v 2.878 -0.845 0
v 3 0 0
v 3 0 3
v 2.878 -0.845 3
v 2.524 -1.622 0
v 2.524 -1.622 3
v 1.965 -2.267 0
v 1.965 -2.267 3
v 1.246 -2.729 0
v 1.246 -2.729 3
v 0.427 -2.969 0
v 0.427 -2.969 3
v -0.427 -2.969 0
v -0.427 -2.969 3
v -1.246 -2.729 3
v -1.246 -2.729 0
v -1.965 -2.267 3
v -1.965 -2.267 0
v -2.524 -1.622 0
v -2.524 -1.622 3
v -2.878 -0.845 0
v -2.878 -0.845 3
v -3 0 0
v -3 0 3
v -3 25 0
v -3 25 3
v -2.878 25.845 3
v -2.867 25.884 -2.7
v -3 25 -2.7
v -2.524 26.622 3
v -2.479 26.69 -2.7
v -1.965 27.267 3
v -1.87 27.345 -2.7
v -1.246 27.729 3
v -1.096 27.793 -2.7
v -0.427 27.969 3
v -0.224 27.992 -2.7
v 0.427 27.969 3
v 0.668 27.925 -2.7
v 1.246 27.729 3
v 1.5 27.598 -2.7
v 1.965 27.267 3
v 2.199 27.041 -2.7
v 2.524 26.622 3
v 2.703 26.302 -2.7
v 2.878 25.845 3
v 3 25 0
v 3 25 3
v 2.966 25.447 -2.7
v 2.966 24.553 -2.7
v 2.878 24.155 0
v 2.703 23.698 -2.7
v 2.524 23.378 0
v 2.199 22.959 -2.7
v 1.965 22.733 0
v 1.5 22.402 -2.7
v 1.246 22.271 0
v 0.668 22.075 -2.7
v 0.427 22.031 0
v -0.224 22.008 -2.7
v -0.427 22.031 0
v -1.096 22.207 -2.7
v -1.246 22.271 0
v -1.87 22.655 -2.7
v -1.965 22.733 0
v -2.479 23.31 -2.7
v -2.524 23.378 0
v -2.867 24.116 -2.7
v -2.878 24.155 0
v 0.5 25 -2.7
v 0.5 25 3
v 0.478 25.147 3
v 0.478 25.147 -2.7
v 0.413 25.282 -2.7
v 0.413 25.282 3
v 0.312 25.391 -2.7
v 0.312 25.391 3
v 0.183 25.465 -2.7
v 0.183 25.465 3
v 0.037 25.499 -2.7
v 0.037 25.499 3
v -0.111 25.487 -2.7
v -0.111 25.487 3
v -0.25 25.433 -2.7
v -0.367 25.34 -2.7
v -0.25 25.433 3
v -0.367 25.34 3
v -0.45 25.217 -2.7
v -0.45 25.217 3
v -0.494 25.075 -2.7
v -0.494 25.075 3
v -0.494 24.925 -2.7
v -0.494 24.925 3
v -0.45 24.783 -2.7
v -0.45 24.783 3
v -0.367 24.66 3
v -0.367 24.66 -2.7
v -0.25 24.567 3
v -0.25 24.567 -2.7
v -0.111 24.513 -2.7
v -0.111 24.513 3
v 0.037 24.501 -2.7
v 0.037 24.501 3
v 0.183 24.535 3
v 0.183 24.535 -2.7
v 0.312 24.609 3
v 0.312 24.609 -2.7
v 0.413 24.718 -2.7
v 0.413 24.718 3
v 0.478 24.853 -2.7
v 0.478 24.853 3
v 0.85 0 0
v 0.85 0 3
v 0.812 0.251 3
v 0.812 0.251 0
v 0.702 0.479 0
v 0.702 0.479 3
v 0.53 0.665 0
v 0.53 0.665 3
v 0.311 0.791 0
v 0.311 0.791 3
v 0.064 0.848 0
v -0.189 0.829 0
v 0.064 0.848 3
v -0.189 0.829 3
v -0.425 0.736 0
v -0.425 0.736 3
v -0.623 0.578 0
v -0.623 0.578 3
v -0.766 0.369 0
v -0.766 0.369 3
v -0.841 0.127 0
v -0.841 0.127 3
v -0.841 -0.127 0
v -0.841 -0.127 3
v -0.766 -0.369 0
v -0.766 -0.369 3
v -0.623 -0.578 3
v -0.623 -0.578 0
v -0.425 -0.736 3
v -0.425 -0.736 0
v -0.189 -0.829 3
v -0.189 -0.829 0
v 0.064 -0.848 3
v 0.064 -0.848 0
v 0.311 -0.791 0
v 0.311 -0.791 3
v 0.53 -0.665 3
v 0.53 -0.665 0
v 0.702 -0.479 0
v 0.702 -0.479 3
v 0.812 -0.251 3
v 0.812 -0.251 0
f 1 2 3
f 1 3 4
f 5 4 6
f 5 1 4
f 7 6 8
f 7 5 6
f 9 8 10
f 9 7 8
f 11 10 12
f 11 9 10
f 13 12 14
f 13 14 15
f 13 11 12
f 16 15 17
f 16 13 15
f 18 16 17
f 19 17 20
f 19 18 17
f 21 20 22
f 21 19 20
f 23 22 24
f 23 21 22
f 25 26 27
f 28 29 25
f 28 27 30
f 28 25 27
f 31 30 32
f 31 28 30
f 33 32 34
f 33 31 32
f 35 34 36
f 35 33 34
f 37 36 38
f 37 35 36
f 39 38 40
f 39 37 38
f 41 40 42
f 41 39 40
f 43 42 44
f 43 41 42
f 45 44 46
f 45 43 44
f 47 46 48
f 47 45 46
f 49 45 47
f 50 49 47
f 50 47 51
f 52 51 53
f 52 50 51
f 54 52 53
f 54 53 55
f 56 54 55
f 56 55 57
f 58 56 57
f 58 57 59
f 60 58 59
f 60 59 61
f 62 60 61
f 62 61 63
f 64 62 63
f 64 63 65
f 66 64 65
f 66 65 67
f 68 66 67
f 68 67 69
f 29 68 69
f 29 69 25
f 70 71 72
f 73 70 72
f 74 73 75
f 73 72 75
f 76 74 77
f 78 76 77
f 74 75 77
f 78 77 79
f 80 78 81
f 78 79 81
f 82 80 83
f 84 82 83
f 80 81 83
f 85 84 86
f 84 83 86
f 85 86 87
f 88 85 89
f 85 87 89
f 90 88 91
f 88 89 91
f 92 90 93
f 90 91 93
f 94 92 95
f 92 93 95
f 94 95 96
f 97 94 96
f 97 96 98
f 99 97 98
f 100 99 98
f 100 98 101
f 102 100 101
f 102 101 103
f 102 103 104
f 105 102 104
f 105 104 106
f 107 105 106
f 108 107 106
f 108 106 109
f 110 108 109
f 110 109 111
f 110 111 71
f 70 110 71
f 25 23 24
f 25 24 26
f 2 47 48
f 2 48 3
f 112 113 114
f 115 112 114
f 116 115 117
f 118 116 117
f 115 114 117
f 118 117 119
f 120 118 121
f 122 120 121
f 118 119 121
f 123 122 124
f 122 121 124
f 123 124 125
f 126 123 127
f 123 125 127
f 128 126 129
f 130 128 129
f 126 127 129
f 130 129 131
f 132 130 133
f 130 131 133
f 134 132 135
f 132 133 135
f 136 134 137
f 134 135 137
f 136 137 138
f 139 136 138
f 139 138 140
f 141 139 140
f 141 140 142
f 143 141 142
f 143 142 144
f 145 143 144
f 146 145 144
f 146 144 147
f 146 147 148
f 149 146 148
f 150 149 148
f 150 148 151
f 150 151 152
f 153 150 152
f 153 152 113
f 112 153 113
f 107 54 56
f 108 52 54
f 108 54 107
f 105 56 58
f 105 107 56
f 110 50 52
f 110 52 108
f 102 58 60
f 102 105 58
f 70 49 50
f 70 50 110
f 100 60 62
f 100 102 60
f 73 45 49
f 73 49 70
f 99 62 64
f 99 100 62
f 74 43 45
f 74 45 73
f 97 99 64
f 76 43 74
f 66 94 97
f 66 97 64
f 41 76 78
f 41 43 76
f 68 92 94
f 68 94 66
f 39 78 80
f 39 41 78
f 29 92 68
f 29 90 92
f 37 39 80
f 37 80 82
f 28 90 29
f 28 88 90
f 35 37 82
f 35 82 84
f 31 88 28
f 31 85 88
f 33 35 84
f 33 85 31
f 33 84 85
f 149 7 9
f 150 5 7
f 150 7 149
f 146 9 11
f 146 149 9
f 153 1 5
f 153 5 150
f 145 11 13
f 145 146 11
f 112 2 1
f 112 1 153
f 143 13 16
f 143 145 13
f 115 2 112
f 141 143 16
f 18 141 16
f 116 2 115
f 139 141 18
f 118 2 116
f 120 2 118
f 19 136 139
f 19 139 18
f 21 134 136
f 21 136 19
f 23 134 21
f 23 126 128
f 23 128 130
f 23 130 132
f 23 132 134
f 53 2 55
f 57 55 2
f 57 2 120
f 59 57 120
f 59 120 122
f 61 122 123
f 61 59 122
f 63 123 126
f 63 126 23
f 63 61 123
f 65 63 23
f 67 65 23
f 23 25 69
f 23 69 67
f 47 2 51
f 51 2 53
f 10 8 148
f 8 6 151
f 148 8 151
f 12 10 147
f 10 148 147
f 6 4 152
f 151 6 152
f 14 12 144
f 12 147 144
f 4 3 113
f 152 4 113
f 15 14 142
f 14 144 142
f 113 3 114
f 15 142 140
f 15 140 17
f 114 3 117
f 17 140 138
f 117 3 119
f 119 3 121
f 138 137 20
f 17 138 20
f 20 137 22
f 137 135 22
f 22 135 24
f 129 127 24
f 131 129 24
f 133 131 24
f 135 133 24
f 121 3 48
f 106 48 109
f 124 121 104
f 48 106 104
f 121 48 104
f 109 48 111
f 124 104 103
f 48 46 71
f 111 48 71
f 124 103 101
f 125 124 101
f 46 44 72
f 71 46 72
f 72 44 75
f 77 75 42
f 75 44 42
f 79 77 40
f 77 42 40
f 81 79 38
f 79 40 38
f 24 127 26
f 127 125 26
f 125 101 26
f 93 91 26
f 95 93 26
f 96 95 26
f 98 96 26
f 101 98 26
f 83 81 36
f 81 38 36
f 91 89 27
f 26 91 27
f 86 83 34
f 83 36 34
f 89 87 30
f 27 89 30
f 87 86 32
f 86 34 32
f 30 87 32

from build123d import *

# Parameters (mm, degrees)
RESSALTO_EXTRUS_O1_DEPTH = 3
CORTE_EXTRUS_O1_REACH    = 30.32
ESBO_O2_R                = 0.85
RESSALTO_EXTRUS_O2_START = 2.7
ESBO_O4_R                = 3
RESSALTO_EXTRUS_O2_DEPTH = 2.7
CORTE_EXTRUS_O2_REACH    = 30.731
ESBO_O3_R                = 0.5


with BuildPart() as part:
    # Esboço1 → Ressalto-extrusão1 (new body)
    with BuildSketch(Plane.XY):
        with BuildLine():
            Line((-3, 0), (-3, 25))
            ThreePointArc((-3, 25), (0, 28), (3, 25))
            Line((3, 25), (3, 0))
            ThreePointArc((3, 0), (0, -3), (-3, 0))
        make_face()
    extrude(amount=RESSALTO_EXTRUS_O1_DEPTH)

    # Esboço2 → Corte-extrusão1 (cut, up to next)
    with BuildSketch(Plane.XY.offset(3), mode=Mode.PRIVATE) as corte_extrus_o1_sk1:
        Circle(ESBO_O2_R)
    corte_extrus_o1_tool1 = extrude(corte_extrus_o1_sk1.sketch, amount=-CORTE_EXTRUS_O1_REACH, mode=Mode.PRIVATE) & part.part
    add(corte_extrus_o1_tool1.solids().sort_by_distance((0, 0, 3))[0], mode=Mode.SUBTRACT)

    # Esboço4 → Ressalto-extrusão2 (add)
    with BuildSketch(Plane(origin=(0, 0, 0), x_dir=(-1, 0, 0), z_dir=(0, 0, -1)).offset(RESSALTO_EXTRUS_O2_START)):
        with Locations((0, 25)):
            Circle(ESBO_O4_R)
    extrude(amount=-RESSALTO_EXTRUS_O2_DEPTH)

    # Esboço3 → Corte-extrusão2 (cut, up to next)
    with BuildSketch(Plane.XY.offset(3), mode=Mode.PRIVATE) as corte_extrus_o2_sk1:
        with Locations((0, 25)):
            Circle(ESBO_O3_R)
    corte_extrus_o2_tool1 = extrude(corte_extrus_o2_sk1.sketch, amount=-CORTE_EXTRUS_O2_REACH, mode=Mode.PRIVATE) & part.part
    add(corte_extrus_o2_tool1.solids().sort_by_distance((0, 25, 3))[0], mode=Mode.SUBTRACT)


solid = part.part
